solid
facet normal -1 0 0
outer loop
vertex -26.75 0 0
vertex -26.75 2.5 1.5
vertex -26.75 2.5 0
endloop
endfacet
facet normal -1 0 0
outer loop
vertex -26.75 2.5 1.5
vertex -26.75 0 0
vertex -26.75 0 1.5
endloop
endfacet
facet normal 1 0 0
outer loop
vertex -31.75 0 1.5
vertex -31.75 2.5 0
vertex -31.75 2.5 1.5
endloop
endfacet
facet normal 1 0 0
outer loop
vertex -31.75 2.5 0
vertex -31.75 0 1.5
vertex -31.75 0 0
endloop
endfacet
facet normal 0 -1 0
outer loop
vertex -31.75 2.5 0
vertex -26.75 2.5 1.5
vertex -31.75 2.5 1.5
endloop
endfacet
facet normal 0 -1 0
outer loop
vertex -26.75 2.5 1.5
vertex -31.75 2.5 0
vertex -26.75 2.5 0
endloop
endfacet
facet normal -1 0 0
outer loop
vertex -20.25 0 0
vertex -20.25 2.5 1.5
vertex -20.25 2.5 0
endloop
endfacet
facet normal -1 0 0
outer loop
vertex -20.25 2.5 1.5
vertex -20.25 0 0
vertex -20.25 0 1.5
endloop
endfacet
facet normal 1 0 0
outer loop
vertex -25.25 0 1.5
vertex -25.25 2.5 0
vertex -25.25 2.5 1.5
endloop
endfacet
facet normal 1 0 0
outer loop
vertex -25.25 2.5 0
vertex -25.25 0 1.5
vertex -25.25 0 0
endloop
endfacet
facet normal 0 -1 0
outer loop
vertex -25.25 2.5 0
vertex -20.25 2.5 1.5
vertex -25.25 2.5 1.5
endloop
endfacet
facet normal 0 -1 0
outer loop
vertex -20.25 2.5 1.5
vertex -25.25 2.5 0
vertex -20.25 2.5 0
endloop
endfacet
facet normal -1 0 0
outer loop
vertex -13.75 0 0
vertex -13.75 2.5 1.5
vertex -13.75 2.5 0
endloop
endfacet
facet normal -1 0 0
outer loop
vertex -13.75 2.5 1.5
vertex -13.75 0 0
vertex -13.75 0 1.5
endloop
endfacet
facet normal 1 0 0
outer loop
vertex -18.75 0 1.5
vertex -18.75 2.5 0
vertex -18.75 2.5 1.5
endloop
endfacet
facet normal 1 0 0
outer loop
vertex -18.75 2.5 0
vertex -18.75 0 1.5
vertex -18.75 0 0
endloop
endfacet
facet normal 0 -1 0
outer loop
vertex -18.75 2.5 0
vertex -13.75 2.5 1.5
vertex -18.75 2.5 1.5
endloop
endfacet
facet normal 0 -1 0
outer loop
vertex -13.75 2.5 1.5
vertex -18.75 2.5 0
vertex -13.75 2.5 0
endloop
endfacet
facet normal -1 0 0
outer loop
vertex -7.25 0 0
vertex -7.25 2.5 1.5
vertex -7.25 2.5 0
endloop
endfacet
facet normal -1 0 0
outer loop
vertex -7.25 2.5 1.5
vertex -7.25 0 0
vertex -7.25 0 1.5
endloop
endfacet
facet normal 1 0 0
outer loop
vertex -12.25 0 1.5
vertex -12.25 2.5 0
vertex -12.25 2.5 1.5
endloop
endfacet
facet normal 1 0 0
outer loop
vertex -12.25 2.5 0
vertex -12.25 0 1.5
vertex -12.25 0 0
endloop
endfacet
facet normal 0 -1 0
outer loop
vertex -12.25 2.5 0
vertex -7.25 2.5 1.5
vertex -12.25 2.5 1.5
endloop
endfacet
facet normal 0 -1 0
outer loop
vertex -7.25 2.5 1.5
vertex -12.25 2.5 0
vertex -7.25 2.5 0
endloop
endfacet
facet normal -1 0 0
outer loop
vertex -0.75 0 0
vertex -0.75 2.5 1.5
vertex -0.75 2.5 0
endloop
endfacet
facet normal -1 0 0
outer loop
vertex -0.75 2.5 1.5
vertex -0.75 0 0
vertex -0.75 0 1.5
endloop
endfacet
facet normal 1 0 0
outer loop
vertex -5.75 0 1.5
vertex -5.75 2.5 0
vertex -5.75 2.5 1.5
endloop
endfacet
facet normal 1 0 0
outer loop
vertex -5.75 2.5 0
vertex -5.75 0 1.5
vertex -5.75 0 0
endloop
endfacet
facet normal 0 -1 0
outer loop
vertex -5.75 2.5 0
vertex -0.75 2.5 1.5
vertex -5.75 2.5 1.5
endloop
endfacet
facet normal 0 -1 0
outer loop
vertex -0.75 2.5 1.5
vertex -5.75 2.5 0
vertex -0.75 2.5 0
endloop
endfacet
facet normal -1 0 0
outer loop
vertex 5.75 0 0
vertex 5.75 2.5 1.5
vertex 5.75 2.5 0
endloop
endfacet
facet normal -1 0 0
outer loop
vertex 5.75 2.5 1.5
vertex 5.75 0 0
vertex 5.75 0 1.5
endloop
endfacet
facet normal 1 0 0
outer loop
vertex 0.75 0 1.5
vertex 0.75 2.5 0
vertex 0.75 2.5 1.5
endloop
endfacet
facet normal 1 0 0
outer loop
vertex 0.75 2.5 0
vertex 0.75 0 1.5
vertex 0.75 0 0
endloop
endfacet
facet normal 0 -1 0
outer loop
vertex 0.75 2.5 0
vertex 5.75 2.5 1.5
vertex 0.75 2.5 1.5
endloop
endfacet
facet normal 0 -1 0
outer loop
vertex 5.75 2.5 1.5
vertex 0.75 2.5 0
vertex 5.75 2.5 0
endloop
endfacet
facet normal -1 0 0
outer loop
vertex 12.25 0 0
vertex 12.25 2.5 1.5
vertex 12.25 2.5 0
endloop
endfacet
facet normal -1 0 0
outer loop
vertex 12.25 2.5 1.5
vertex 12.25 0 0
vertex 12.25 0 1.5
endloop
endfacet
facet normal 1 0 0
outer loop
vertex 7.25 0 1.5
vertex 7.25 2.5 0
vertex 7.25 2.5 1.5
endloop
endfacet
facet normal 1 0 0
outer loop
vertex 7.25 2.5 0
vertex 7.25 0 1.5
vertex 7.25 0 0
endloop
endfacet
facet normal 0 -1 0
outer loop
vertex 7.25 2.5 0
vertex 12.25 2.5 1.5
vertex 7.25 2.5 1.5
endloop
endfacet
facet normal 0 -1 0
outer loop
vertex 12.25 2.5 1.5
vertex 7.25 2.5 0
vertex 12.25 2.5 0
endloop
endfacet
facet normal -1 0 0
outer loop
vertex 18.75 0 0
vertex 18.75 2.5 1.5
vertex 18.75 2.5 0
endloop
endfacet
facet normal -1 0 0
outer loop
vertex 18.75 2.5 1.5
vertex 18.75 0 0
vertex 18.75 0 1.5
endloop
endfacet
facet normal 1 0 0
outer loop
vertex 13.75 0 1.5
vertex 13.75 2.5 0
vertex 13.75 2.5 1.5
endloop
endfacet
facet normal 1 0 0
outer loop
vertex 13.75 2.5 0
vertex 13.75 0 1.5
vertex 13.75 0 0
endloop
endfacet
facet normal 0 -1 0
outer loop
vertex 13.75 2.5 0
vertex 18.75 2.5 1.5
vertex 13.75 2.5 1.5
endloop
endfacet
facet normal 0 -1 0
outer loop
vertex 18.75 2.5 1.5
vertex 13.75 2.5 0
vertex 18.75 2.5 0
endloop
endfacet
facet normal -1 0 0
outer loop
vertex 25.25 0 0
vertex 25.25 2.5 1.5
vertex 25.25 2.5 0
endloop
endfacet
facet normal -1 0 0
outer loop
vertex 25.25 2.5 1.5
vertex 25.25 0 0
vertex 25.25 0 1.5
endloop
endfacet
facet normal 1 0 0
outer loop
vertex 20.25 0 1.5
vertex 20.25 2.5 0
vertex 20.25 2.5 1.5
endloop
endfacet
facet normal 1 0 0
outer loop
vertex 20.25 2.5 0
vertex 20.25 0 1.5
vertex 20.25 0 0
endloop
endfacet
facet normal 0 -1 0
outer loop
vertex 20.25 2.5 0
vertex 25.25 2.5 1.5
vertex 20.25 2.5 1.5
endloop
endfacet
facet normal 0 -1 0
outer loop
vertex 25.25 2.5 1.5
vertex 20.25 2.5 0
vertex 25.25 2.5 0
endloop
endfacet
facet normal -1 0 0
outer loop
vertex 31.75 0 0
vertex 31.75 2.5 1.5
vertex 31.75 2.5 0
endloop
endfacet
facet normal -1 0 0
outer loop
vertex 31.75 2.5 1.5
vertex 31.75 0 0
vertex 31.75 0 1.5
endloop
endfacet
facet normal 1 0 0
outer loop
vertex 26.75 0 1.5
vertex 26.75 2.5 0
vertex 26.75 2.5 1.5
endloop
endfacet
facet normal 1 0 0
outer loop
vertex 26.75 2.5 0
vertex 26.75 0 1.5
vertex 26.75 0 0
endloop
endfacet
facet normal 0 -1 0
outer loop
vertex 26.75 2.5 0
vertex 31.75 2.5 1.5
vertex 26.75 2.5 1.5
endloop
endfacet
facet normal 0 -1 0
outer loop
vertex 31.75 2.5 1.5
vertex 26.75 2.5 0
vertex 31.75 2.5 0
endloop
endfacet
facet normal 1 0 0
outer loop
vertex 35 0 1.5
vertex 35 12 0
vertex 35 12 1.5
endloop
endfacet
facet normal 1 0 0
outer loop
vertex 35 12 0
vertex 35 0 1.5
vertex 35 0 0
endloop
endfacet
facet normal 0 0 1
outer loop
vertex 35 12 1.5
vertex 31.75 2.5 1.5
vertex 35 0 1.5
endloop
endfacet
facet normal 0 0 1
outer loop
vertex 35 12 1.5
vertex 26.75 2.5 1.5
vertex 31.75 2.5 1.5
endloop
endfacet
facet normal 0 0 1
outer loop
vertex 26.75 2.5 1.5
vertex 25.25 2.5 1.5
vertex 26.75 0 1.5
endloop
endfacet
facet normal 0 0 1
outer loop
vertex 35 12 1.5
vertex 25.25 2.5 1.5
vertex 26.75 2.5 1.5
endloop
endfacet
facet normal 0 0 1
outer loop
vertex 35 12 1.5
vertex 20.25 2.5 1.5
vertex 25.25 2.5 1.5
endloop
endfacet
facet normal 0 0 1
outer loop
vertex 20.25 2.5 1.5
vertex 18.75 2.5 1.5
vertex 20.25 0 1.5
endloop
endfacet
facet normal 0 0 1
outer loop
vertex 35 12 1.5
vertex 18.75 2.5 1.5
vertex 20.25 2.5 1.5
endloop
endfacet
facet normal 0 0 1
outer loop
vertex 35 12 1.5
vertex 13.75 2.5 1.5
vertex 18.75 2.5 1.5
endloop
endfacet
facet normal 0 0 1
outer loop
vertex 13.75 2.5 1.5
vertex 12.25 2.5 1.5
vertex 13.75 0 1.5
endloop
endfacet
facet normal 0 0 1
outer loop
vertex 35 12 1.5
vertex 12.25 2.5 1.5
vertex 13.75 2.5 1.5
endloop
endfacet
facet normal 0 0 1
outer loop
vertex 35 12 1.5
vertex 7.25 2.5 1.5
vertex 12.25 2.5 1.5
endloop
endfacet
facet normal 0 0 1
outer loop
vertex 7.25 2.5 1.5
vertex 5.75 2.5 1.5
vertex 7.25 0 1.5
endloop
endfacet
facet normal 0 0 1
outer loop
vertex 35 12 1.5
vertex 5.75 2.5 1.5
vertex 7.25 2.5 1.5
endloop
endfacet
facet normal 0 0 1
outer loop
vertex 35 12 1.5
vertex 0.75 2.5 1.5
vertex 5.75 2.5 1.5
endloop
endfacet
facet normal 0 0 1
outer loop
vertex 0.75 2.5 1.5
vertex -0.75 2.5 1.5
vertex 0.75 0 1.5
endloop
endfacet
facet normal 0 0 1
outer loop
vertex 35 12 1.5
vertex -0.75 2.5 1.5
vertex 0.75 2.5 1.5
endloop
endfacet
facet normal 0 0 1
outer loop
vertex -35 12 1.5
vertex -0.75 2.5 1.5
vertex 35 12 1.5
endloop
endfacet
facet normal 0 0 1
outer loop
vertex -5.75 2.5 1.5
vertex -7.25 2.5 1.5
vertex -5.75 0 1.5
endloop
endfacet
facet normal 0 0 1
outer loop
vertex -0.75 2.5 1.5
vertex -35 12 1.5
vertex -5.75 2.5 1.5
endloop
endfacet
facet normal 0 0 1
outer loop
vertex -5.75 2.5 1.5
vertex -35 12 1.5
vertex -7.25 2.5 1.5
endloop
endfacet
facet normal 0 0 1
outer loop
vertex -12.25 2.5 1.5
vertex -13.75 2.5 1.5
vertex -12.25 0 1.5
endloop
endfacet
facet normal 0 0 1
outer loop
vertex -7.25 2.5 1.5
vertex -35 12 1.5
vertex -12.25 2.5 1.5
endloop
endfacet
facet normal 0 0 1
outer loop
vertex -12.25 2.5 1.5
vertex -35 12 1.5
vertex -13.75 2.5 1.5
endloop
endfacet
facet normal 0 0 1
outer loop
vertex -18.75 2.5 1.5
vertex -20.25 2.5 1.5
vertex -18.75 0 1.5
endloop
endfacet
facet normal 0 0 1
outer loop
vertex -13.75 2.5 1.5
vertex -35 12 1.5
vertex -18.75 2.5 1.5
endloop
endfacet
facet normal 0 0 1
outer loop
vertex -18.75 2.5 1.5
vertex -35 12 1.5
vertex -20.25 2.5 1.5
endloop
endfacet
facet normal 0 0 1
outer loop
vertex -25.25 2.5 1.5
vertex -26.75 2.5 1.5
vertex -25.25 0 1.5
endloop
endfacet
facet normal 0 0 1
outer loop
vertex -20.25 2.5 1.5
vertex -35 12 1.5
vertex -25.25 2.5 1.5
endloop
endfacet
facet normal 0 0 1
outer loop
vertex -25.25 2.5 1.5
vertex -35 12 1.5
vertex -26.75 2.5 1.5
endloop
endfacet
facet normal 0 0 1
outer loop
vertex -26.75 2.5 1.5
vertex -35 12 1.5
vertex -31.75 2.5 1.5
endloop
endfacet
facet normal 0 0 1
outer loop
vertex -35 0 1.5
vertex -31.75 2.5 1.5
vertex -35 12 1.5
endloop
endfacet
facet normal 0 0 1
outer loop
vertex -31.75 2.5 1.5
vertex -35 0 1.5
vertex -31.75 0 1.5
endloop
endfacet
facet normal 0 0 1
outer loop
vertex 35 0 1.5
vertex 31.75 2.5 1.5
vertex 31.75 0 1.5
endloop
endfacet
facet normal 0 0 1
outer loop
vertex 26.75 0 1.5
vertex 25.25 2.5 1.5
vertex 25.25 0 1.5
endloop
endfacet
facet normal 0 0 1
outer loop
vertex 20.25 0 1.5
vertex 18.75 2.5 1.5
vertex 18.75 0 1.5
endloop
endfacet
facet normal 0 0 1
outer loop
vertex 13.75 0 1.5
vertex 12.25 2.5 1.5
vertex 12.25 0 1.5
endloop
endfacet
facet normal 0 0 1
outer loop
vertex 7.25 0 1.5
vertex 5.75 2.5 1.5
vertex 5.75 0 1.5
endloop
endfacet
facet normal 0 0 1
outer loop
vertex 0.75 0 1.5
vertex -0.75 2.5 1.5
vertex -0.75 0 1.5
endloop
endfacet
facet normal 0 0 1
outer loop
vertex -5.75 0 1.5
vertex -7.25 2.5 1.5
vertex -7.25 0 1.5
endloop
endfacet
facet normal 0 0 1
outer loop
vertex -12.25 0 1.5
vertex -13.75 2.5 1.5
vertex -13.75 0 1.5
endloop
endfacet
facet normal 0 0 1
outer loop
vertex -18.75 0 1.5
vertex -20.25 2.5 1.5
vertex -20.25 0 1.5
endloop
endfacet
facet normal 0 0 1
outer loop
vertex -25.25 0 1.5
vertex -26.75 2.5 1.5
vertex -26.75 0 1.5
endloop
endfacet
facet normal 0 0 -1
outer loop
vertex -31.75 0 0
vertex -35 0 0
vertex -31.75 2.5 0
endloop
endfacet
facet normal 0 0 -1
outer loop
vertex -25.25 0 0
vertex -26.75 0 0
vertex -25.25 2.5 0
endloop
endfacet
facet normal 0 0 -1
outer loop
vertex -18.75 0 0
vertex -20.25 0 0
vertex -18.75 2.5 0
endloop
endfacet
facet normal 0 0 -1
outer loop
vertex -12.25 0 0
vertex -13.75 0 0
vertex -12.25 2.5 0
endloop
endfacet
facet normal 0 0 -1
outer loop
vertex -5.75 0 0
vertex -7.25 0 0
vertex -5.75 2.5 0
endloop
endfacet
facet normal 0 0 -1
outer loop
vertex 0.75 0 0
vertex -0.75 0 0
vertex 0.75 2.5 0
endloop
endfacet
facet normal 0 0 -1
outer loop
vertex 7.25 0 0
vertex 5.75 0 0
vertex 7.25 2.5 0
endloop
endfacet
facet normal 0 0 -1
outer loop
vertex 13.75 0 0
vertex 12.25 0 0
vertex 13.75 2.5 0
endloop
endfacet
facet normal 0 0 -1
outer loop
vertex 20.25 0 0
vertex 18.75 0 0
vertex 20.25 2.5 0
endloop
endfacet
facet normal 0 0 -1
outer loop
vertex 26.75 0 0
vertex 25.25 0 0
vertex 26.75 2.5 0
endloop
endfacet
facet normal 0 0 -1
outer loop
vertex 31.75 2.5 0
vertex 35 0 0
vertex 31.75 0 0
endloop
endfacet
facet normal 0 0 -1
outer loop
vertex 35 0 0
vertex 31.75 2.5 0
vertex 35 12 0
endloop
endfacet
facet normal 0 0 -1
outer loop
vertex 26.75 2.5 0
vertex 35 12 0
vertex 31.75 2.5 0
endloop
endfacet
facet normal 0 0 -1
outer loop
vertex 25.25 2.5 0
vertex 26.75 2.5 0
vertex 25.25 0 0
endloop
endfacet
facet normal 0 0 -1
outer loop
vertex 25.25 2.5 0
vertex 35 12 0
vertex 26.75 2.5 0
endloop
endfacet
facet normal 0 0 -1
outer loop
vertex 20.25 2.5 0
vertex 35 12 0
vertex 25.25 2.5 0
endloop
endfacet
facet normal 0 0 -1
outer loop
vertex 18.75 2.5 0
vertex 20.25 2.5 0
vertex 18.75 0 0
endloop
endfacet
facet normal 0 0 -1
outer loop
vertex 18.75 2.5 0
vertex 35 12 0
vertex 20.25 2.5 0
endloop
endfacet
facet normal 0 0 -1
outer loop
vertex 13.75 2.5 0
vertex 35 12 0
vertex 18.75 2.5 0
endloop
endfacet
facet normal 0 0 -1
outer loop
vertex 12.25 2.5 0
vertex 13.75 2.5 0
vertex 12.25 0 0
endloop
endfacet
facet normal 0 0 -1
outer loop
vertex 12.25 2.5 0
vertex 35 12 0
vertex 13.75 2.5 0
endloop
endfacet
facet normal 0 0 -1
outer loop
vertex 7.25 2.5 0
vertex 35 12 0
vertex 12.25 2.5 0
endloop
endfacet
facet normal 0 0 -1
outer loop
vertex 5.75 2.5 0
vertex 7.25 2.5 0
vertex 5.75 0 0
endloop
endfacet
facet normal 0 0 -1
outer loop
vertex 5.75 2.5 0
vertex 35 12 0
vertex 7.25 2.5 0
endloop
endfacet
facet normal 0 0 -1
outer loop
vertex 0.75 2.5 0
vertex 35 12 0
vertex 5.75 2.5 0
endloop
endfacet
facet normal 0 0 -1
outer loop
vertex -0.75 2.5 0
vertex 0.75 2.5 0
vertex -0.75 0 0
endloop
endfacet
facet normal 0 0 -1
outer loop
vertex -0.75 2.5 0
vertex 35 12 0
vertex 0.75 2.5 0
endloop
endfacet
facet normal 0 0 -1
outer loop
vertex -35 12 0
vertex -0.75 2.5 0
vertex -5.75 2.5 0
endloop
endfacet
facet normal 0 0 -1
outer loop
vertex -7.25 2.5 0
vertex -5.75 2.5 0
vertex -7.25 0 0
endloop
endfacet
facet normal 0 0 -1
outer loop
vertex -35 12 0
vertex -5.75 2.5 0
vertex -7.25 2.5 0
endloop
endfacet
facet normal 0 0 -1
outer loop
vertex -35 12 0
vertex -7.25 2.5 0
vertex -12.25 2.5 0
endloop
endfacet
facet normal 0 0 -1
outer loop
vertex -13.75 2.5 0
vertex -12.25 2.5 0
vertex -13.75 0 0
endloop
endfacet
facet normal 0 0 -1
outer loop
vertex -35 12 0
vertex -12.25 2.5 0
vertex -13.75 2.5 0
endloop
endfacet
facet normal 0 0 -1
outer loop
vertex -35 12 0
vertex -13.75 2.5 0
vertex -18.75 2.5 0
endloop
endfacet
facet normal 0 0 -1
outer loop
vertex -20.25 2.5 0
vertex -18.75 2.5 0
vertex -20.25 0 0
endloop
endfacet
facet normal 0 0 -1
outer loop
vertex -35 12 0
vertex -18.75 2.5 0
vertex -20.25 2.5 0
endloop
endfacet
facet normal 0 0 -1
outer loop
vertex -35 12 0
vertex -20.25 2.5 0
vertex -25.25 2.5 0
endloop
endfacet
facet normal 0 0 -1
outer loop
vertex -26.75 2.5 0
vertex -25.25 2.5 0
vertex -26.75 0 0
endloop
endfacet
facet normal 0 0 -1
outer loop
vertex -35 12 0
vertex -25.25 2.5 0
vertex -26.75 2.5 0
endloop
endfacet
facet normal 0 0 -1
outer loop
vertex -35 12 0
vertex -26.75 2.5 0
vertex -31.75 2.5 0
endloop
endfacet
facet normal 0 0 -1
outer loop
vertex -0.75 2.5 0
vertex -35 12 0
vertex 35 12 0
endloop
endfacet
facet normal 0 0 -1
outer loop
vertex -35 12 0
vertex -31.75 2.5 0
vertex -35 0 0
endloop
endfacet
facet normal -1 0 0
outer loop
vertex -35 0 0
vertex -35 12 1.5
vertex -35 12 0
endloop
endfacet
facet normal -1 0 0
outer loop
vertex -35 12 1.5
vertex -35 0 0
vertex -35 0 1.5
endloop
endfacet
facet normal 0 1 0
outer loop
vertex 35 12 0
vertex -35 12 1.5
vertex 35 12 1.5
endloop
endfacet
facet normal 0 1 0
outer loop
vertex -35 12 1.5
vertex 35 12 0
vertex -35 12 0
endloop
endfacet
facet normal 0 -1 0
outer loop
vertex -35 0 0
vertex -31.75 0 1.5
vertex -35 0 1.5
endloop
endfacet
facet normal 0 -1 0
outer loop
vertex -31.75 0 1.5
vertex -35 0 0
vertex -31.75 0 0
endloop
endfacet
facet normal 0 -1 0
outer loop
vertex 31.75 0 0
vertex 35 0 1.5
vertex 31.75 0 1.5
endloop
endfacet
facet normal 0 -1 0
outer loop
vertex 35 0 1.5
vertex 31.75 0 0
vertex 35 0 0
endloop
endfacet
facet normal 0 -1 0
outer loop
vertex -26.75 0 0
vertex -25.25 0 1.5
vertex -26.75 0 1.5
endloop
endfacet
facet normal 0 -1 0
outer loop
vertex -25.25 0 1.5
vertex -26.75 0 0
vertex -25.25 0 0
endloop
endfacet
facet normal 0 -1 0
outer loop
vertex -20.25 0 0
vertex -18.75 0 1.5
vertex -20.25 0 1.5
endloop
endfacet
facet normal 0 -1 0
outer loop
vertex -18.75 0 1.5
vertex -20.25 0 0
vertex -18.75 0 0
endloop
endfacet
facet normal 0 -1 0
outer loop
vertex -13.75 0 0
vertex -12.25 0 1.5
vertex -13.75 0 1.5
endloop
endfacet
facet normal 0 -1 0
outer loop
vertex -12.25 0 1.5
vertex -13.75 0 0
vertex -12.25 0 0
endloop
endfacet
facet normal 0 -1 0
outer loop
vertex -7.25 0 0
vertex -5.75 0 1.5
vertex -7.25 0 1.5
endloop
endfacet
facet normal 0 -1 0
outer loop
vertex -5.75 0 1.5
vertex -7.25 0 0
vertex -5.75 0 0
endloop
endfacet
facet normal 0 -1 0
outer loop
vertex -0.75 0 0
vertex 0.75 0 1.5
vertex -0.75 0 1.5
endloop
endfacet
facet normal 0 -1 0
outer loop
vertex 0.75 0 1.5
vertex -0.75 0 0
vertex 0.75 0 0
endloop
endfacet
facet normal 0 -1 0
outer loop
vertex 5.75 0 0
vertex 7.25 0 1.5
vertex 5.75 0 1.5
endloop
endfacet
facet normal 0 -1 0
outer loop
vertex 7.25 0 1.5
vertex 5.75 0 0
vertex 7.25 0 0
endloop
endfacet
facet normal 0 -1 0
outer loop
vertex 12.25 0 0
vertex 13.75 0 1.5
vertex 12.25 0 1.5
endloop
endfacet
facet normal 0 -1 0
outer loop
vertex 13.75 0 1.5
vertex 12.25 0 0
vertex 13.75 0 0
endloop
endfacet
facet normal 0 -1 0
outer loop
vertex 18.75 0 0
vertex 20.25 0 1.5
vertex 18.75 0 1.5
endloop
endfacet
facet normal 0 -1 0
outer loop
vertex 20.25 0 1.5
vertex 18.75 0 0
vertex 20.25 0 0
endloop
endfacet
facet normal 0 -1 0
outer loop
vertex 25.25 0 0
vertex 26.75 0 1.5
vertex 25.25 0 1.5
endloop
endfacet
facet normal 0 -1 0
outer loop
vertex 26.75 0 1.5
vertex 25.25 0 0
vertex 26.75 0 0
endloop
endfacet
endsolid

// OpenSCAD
// 10-well comb for casting agarose gels
// Print orientation: flat on bed, teeth pointing down (-Y)

$fn = 64;

// ---- Dimensions (mm) ----
plate_t      = 1.5;   // plate thickness (Z)
spine_len    = 70;    // spine length (X)
spine_w      = 12;    // spine width (Y)
tooth_n      = 10;    // number of teeth
tooth_w      = 5.0;   // tooth width (X)
tooth_len    = 12;    // tooth length (Y)
gap          = 1.5;   // gap between teeth (X)
overcut      = 0.5;   // cutter overshoot past faces (Z)

// ---- Derived ----
pitch   = tooth_w + gap;            // centre-to-centre spacing
x_start = -(tooth_n - 1) * pitch / 2; // first tooth centre (row centred)

difference() {
    // Plate with spine
    translate([-spine_len / 2, 0, 0])
        cube([spine_len, spine_w, plate_t]);

    // Teeth
    for (i = [0 : tooth_n - 1])
        translate([x_start + i * pitch - tooth_w / 2,
                   -tooth_len,
                   -overcut])
            cube([tooth_w, tooth_len + plate_t + 2 * overcut,
                  plate_t + 2 * overcut]);
}
